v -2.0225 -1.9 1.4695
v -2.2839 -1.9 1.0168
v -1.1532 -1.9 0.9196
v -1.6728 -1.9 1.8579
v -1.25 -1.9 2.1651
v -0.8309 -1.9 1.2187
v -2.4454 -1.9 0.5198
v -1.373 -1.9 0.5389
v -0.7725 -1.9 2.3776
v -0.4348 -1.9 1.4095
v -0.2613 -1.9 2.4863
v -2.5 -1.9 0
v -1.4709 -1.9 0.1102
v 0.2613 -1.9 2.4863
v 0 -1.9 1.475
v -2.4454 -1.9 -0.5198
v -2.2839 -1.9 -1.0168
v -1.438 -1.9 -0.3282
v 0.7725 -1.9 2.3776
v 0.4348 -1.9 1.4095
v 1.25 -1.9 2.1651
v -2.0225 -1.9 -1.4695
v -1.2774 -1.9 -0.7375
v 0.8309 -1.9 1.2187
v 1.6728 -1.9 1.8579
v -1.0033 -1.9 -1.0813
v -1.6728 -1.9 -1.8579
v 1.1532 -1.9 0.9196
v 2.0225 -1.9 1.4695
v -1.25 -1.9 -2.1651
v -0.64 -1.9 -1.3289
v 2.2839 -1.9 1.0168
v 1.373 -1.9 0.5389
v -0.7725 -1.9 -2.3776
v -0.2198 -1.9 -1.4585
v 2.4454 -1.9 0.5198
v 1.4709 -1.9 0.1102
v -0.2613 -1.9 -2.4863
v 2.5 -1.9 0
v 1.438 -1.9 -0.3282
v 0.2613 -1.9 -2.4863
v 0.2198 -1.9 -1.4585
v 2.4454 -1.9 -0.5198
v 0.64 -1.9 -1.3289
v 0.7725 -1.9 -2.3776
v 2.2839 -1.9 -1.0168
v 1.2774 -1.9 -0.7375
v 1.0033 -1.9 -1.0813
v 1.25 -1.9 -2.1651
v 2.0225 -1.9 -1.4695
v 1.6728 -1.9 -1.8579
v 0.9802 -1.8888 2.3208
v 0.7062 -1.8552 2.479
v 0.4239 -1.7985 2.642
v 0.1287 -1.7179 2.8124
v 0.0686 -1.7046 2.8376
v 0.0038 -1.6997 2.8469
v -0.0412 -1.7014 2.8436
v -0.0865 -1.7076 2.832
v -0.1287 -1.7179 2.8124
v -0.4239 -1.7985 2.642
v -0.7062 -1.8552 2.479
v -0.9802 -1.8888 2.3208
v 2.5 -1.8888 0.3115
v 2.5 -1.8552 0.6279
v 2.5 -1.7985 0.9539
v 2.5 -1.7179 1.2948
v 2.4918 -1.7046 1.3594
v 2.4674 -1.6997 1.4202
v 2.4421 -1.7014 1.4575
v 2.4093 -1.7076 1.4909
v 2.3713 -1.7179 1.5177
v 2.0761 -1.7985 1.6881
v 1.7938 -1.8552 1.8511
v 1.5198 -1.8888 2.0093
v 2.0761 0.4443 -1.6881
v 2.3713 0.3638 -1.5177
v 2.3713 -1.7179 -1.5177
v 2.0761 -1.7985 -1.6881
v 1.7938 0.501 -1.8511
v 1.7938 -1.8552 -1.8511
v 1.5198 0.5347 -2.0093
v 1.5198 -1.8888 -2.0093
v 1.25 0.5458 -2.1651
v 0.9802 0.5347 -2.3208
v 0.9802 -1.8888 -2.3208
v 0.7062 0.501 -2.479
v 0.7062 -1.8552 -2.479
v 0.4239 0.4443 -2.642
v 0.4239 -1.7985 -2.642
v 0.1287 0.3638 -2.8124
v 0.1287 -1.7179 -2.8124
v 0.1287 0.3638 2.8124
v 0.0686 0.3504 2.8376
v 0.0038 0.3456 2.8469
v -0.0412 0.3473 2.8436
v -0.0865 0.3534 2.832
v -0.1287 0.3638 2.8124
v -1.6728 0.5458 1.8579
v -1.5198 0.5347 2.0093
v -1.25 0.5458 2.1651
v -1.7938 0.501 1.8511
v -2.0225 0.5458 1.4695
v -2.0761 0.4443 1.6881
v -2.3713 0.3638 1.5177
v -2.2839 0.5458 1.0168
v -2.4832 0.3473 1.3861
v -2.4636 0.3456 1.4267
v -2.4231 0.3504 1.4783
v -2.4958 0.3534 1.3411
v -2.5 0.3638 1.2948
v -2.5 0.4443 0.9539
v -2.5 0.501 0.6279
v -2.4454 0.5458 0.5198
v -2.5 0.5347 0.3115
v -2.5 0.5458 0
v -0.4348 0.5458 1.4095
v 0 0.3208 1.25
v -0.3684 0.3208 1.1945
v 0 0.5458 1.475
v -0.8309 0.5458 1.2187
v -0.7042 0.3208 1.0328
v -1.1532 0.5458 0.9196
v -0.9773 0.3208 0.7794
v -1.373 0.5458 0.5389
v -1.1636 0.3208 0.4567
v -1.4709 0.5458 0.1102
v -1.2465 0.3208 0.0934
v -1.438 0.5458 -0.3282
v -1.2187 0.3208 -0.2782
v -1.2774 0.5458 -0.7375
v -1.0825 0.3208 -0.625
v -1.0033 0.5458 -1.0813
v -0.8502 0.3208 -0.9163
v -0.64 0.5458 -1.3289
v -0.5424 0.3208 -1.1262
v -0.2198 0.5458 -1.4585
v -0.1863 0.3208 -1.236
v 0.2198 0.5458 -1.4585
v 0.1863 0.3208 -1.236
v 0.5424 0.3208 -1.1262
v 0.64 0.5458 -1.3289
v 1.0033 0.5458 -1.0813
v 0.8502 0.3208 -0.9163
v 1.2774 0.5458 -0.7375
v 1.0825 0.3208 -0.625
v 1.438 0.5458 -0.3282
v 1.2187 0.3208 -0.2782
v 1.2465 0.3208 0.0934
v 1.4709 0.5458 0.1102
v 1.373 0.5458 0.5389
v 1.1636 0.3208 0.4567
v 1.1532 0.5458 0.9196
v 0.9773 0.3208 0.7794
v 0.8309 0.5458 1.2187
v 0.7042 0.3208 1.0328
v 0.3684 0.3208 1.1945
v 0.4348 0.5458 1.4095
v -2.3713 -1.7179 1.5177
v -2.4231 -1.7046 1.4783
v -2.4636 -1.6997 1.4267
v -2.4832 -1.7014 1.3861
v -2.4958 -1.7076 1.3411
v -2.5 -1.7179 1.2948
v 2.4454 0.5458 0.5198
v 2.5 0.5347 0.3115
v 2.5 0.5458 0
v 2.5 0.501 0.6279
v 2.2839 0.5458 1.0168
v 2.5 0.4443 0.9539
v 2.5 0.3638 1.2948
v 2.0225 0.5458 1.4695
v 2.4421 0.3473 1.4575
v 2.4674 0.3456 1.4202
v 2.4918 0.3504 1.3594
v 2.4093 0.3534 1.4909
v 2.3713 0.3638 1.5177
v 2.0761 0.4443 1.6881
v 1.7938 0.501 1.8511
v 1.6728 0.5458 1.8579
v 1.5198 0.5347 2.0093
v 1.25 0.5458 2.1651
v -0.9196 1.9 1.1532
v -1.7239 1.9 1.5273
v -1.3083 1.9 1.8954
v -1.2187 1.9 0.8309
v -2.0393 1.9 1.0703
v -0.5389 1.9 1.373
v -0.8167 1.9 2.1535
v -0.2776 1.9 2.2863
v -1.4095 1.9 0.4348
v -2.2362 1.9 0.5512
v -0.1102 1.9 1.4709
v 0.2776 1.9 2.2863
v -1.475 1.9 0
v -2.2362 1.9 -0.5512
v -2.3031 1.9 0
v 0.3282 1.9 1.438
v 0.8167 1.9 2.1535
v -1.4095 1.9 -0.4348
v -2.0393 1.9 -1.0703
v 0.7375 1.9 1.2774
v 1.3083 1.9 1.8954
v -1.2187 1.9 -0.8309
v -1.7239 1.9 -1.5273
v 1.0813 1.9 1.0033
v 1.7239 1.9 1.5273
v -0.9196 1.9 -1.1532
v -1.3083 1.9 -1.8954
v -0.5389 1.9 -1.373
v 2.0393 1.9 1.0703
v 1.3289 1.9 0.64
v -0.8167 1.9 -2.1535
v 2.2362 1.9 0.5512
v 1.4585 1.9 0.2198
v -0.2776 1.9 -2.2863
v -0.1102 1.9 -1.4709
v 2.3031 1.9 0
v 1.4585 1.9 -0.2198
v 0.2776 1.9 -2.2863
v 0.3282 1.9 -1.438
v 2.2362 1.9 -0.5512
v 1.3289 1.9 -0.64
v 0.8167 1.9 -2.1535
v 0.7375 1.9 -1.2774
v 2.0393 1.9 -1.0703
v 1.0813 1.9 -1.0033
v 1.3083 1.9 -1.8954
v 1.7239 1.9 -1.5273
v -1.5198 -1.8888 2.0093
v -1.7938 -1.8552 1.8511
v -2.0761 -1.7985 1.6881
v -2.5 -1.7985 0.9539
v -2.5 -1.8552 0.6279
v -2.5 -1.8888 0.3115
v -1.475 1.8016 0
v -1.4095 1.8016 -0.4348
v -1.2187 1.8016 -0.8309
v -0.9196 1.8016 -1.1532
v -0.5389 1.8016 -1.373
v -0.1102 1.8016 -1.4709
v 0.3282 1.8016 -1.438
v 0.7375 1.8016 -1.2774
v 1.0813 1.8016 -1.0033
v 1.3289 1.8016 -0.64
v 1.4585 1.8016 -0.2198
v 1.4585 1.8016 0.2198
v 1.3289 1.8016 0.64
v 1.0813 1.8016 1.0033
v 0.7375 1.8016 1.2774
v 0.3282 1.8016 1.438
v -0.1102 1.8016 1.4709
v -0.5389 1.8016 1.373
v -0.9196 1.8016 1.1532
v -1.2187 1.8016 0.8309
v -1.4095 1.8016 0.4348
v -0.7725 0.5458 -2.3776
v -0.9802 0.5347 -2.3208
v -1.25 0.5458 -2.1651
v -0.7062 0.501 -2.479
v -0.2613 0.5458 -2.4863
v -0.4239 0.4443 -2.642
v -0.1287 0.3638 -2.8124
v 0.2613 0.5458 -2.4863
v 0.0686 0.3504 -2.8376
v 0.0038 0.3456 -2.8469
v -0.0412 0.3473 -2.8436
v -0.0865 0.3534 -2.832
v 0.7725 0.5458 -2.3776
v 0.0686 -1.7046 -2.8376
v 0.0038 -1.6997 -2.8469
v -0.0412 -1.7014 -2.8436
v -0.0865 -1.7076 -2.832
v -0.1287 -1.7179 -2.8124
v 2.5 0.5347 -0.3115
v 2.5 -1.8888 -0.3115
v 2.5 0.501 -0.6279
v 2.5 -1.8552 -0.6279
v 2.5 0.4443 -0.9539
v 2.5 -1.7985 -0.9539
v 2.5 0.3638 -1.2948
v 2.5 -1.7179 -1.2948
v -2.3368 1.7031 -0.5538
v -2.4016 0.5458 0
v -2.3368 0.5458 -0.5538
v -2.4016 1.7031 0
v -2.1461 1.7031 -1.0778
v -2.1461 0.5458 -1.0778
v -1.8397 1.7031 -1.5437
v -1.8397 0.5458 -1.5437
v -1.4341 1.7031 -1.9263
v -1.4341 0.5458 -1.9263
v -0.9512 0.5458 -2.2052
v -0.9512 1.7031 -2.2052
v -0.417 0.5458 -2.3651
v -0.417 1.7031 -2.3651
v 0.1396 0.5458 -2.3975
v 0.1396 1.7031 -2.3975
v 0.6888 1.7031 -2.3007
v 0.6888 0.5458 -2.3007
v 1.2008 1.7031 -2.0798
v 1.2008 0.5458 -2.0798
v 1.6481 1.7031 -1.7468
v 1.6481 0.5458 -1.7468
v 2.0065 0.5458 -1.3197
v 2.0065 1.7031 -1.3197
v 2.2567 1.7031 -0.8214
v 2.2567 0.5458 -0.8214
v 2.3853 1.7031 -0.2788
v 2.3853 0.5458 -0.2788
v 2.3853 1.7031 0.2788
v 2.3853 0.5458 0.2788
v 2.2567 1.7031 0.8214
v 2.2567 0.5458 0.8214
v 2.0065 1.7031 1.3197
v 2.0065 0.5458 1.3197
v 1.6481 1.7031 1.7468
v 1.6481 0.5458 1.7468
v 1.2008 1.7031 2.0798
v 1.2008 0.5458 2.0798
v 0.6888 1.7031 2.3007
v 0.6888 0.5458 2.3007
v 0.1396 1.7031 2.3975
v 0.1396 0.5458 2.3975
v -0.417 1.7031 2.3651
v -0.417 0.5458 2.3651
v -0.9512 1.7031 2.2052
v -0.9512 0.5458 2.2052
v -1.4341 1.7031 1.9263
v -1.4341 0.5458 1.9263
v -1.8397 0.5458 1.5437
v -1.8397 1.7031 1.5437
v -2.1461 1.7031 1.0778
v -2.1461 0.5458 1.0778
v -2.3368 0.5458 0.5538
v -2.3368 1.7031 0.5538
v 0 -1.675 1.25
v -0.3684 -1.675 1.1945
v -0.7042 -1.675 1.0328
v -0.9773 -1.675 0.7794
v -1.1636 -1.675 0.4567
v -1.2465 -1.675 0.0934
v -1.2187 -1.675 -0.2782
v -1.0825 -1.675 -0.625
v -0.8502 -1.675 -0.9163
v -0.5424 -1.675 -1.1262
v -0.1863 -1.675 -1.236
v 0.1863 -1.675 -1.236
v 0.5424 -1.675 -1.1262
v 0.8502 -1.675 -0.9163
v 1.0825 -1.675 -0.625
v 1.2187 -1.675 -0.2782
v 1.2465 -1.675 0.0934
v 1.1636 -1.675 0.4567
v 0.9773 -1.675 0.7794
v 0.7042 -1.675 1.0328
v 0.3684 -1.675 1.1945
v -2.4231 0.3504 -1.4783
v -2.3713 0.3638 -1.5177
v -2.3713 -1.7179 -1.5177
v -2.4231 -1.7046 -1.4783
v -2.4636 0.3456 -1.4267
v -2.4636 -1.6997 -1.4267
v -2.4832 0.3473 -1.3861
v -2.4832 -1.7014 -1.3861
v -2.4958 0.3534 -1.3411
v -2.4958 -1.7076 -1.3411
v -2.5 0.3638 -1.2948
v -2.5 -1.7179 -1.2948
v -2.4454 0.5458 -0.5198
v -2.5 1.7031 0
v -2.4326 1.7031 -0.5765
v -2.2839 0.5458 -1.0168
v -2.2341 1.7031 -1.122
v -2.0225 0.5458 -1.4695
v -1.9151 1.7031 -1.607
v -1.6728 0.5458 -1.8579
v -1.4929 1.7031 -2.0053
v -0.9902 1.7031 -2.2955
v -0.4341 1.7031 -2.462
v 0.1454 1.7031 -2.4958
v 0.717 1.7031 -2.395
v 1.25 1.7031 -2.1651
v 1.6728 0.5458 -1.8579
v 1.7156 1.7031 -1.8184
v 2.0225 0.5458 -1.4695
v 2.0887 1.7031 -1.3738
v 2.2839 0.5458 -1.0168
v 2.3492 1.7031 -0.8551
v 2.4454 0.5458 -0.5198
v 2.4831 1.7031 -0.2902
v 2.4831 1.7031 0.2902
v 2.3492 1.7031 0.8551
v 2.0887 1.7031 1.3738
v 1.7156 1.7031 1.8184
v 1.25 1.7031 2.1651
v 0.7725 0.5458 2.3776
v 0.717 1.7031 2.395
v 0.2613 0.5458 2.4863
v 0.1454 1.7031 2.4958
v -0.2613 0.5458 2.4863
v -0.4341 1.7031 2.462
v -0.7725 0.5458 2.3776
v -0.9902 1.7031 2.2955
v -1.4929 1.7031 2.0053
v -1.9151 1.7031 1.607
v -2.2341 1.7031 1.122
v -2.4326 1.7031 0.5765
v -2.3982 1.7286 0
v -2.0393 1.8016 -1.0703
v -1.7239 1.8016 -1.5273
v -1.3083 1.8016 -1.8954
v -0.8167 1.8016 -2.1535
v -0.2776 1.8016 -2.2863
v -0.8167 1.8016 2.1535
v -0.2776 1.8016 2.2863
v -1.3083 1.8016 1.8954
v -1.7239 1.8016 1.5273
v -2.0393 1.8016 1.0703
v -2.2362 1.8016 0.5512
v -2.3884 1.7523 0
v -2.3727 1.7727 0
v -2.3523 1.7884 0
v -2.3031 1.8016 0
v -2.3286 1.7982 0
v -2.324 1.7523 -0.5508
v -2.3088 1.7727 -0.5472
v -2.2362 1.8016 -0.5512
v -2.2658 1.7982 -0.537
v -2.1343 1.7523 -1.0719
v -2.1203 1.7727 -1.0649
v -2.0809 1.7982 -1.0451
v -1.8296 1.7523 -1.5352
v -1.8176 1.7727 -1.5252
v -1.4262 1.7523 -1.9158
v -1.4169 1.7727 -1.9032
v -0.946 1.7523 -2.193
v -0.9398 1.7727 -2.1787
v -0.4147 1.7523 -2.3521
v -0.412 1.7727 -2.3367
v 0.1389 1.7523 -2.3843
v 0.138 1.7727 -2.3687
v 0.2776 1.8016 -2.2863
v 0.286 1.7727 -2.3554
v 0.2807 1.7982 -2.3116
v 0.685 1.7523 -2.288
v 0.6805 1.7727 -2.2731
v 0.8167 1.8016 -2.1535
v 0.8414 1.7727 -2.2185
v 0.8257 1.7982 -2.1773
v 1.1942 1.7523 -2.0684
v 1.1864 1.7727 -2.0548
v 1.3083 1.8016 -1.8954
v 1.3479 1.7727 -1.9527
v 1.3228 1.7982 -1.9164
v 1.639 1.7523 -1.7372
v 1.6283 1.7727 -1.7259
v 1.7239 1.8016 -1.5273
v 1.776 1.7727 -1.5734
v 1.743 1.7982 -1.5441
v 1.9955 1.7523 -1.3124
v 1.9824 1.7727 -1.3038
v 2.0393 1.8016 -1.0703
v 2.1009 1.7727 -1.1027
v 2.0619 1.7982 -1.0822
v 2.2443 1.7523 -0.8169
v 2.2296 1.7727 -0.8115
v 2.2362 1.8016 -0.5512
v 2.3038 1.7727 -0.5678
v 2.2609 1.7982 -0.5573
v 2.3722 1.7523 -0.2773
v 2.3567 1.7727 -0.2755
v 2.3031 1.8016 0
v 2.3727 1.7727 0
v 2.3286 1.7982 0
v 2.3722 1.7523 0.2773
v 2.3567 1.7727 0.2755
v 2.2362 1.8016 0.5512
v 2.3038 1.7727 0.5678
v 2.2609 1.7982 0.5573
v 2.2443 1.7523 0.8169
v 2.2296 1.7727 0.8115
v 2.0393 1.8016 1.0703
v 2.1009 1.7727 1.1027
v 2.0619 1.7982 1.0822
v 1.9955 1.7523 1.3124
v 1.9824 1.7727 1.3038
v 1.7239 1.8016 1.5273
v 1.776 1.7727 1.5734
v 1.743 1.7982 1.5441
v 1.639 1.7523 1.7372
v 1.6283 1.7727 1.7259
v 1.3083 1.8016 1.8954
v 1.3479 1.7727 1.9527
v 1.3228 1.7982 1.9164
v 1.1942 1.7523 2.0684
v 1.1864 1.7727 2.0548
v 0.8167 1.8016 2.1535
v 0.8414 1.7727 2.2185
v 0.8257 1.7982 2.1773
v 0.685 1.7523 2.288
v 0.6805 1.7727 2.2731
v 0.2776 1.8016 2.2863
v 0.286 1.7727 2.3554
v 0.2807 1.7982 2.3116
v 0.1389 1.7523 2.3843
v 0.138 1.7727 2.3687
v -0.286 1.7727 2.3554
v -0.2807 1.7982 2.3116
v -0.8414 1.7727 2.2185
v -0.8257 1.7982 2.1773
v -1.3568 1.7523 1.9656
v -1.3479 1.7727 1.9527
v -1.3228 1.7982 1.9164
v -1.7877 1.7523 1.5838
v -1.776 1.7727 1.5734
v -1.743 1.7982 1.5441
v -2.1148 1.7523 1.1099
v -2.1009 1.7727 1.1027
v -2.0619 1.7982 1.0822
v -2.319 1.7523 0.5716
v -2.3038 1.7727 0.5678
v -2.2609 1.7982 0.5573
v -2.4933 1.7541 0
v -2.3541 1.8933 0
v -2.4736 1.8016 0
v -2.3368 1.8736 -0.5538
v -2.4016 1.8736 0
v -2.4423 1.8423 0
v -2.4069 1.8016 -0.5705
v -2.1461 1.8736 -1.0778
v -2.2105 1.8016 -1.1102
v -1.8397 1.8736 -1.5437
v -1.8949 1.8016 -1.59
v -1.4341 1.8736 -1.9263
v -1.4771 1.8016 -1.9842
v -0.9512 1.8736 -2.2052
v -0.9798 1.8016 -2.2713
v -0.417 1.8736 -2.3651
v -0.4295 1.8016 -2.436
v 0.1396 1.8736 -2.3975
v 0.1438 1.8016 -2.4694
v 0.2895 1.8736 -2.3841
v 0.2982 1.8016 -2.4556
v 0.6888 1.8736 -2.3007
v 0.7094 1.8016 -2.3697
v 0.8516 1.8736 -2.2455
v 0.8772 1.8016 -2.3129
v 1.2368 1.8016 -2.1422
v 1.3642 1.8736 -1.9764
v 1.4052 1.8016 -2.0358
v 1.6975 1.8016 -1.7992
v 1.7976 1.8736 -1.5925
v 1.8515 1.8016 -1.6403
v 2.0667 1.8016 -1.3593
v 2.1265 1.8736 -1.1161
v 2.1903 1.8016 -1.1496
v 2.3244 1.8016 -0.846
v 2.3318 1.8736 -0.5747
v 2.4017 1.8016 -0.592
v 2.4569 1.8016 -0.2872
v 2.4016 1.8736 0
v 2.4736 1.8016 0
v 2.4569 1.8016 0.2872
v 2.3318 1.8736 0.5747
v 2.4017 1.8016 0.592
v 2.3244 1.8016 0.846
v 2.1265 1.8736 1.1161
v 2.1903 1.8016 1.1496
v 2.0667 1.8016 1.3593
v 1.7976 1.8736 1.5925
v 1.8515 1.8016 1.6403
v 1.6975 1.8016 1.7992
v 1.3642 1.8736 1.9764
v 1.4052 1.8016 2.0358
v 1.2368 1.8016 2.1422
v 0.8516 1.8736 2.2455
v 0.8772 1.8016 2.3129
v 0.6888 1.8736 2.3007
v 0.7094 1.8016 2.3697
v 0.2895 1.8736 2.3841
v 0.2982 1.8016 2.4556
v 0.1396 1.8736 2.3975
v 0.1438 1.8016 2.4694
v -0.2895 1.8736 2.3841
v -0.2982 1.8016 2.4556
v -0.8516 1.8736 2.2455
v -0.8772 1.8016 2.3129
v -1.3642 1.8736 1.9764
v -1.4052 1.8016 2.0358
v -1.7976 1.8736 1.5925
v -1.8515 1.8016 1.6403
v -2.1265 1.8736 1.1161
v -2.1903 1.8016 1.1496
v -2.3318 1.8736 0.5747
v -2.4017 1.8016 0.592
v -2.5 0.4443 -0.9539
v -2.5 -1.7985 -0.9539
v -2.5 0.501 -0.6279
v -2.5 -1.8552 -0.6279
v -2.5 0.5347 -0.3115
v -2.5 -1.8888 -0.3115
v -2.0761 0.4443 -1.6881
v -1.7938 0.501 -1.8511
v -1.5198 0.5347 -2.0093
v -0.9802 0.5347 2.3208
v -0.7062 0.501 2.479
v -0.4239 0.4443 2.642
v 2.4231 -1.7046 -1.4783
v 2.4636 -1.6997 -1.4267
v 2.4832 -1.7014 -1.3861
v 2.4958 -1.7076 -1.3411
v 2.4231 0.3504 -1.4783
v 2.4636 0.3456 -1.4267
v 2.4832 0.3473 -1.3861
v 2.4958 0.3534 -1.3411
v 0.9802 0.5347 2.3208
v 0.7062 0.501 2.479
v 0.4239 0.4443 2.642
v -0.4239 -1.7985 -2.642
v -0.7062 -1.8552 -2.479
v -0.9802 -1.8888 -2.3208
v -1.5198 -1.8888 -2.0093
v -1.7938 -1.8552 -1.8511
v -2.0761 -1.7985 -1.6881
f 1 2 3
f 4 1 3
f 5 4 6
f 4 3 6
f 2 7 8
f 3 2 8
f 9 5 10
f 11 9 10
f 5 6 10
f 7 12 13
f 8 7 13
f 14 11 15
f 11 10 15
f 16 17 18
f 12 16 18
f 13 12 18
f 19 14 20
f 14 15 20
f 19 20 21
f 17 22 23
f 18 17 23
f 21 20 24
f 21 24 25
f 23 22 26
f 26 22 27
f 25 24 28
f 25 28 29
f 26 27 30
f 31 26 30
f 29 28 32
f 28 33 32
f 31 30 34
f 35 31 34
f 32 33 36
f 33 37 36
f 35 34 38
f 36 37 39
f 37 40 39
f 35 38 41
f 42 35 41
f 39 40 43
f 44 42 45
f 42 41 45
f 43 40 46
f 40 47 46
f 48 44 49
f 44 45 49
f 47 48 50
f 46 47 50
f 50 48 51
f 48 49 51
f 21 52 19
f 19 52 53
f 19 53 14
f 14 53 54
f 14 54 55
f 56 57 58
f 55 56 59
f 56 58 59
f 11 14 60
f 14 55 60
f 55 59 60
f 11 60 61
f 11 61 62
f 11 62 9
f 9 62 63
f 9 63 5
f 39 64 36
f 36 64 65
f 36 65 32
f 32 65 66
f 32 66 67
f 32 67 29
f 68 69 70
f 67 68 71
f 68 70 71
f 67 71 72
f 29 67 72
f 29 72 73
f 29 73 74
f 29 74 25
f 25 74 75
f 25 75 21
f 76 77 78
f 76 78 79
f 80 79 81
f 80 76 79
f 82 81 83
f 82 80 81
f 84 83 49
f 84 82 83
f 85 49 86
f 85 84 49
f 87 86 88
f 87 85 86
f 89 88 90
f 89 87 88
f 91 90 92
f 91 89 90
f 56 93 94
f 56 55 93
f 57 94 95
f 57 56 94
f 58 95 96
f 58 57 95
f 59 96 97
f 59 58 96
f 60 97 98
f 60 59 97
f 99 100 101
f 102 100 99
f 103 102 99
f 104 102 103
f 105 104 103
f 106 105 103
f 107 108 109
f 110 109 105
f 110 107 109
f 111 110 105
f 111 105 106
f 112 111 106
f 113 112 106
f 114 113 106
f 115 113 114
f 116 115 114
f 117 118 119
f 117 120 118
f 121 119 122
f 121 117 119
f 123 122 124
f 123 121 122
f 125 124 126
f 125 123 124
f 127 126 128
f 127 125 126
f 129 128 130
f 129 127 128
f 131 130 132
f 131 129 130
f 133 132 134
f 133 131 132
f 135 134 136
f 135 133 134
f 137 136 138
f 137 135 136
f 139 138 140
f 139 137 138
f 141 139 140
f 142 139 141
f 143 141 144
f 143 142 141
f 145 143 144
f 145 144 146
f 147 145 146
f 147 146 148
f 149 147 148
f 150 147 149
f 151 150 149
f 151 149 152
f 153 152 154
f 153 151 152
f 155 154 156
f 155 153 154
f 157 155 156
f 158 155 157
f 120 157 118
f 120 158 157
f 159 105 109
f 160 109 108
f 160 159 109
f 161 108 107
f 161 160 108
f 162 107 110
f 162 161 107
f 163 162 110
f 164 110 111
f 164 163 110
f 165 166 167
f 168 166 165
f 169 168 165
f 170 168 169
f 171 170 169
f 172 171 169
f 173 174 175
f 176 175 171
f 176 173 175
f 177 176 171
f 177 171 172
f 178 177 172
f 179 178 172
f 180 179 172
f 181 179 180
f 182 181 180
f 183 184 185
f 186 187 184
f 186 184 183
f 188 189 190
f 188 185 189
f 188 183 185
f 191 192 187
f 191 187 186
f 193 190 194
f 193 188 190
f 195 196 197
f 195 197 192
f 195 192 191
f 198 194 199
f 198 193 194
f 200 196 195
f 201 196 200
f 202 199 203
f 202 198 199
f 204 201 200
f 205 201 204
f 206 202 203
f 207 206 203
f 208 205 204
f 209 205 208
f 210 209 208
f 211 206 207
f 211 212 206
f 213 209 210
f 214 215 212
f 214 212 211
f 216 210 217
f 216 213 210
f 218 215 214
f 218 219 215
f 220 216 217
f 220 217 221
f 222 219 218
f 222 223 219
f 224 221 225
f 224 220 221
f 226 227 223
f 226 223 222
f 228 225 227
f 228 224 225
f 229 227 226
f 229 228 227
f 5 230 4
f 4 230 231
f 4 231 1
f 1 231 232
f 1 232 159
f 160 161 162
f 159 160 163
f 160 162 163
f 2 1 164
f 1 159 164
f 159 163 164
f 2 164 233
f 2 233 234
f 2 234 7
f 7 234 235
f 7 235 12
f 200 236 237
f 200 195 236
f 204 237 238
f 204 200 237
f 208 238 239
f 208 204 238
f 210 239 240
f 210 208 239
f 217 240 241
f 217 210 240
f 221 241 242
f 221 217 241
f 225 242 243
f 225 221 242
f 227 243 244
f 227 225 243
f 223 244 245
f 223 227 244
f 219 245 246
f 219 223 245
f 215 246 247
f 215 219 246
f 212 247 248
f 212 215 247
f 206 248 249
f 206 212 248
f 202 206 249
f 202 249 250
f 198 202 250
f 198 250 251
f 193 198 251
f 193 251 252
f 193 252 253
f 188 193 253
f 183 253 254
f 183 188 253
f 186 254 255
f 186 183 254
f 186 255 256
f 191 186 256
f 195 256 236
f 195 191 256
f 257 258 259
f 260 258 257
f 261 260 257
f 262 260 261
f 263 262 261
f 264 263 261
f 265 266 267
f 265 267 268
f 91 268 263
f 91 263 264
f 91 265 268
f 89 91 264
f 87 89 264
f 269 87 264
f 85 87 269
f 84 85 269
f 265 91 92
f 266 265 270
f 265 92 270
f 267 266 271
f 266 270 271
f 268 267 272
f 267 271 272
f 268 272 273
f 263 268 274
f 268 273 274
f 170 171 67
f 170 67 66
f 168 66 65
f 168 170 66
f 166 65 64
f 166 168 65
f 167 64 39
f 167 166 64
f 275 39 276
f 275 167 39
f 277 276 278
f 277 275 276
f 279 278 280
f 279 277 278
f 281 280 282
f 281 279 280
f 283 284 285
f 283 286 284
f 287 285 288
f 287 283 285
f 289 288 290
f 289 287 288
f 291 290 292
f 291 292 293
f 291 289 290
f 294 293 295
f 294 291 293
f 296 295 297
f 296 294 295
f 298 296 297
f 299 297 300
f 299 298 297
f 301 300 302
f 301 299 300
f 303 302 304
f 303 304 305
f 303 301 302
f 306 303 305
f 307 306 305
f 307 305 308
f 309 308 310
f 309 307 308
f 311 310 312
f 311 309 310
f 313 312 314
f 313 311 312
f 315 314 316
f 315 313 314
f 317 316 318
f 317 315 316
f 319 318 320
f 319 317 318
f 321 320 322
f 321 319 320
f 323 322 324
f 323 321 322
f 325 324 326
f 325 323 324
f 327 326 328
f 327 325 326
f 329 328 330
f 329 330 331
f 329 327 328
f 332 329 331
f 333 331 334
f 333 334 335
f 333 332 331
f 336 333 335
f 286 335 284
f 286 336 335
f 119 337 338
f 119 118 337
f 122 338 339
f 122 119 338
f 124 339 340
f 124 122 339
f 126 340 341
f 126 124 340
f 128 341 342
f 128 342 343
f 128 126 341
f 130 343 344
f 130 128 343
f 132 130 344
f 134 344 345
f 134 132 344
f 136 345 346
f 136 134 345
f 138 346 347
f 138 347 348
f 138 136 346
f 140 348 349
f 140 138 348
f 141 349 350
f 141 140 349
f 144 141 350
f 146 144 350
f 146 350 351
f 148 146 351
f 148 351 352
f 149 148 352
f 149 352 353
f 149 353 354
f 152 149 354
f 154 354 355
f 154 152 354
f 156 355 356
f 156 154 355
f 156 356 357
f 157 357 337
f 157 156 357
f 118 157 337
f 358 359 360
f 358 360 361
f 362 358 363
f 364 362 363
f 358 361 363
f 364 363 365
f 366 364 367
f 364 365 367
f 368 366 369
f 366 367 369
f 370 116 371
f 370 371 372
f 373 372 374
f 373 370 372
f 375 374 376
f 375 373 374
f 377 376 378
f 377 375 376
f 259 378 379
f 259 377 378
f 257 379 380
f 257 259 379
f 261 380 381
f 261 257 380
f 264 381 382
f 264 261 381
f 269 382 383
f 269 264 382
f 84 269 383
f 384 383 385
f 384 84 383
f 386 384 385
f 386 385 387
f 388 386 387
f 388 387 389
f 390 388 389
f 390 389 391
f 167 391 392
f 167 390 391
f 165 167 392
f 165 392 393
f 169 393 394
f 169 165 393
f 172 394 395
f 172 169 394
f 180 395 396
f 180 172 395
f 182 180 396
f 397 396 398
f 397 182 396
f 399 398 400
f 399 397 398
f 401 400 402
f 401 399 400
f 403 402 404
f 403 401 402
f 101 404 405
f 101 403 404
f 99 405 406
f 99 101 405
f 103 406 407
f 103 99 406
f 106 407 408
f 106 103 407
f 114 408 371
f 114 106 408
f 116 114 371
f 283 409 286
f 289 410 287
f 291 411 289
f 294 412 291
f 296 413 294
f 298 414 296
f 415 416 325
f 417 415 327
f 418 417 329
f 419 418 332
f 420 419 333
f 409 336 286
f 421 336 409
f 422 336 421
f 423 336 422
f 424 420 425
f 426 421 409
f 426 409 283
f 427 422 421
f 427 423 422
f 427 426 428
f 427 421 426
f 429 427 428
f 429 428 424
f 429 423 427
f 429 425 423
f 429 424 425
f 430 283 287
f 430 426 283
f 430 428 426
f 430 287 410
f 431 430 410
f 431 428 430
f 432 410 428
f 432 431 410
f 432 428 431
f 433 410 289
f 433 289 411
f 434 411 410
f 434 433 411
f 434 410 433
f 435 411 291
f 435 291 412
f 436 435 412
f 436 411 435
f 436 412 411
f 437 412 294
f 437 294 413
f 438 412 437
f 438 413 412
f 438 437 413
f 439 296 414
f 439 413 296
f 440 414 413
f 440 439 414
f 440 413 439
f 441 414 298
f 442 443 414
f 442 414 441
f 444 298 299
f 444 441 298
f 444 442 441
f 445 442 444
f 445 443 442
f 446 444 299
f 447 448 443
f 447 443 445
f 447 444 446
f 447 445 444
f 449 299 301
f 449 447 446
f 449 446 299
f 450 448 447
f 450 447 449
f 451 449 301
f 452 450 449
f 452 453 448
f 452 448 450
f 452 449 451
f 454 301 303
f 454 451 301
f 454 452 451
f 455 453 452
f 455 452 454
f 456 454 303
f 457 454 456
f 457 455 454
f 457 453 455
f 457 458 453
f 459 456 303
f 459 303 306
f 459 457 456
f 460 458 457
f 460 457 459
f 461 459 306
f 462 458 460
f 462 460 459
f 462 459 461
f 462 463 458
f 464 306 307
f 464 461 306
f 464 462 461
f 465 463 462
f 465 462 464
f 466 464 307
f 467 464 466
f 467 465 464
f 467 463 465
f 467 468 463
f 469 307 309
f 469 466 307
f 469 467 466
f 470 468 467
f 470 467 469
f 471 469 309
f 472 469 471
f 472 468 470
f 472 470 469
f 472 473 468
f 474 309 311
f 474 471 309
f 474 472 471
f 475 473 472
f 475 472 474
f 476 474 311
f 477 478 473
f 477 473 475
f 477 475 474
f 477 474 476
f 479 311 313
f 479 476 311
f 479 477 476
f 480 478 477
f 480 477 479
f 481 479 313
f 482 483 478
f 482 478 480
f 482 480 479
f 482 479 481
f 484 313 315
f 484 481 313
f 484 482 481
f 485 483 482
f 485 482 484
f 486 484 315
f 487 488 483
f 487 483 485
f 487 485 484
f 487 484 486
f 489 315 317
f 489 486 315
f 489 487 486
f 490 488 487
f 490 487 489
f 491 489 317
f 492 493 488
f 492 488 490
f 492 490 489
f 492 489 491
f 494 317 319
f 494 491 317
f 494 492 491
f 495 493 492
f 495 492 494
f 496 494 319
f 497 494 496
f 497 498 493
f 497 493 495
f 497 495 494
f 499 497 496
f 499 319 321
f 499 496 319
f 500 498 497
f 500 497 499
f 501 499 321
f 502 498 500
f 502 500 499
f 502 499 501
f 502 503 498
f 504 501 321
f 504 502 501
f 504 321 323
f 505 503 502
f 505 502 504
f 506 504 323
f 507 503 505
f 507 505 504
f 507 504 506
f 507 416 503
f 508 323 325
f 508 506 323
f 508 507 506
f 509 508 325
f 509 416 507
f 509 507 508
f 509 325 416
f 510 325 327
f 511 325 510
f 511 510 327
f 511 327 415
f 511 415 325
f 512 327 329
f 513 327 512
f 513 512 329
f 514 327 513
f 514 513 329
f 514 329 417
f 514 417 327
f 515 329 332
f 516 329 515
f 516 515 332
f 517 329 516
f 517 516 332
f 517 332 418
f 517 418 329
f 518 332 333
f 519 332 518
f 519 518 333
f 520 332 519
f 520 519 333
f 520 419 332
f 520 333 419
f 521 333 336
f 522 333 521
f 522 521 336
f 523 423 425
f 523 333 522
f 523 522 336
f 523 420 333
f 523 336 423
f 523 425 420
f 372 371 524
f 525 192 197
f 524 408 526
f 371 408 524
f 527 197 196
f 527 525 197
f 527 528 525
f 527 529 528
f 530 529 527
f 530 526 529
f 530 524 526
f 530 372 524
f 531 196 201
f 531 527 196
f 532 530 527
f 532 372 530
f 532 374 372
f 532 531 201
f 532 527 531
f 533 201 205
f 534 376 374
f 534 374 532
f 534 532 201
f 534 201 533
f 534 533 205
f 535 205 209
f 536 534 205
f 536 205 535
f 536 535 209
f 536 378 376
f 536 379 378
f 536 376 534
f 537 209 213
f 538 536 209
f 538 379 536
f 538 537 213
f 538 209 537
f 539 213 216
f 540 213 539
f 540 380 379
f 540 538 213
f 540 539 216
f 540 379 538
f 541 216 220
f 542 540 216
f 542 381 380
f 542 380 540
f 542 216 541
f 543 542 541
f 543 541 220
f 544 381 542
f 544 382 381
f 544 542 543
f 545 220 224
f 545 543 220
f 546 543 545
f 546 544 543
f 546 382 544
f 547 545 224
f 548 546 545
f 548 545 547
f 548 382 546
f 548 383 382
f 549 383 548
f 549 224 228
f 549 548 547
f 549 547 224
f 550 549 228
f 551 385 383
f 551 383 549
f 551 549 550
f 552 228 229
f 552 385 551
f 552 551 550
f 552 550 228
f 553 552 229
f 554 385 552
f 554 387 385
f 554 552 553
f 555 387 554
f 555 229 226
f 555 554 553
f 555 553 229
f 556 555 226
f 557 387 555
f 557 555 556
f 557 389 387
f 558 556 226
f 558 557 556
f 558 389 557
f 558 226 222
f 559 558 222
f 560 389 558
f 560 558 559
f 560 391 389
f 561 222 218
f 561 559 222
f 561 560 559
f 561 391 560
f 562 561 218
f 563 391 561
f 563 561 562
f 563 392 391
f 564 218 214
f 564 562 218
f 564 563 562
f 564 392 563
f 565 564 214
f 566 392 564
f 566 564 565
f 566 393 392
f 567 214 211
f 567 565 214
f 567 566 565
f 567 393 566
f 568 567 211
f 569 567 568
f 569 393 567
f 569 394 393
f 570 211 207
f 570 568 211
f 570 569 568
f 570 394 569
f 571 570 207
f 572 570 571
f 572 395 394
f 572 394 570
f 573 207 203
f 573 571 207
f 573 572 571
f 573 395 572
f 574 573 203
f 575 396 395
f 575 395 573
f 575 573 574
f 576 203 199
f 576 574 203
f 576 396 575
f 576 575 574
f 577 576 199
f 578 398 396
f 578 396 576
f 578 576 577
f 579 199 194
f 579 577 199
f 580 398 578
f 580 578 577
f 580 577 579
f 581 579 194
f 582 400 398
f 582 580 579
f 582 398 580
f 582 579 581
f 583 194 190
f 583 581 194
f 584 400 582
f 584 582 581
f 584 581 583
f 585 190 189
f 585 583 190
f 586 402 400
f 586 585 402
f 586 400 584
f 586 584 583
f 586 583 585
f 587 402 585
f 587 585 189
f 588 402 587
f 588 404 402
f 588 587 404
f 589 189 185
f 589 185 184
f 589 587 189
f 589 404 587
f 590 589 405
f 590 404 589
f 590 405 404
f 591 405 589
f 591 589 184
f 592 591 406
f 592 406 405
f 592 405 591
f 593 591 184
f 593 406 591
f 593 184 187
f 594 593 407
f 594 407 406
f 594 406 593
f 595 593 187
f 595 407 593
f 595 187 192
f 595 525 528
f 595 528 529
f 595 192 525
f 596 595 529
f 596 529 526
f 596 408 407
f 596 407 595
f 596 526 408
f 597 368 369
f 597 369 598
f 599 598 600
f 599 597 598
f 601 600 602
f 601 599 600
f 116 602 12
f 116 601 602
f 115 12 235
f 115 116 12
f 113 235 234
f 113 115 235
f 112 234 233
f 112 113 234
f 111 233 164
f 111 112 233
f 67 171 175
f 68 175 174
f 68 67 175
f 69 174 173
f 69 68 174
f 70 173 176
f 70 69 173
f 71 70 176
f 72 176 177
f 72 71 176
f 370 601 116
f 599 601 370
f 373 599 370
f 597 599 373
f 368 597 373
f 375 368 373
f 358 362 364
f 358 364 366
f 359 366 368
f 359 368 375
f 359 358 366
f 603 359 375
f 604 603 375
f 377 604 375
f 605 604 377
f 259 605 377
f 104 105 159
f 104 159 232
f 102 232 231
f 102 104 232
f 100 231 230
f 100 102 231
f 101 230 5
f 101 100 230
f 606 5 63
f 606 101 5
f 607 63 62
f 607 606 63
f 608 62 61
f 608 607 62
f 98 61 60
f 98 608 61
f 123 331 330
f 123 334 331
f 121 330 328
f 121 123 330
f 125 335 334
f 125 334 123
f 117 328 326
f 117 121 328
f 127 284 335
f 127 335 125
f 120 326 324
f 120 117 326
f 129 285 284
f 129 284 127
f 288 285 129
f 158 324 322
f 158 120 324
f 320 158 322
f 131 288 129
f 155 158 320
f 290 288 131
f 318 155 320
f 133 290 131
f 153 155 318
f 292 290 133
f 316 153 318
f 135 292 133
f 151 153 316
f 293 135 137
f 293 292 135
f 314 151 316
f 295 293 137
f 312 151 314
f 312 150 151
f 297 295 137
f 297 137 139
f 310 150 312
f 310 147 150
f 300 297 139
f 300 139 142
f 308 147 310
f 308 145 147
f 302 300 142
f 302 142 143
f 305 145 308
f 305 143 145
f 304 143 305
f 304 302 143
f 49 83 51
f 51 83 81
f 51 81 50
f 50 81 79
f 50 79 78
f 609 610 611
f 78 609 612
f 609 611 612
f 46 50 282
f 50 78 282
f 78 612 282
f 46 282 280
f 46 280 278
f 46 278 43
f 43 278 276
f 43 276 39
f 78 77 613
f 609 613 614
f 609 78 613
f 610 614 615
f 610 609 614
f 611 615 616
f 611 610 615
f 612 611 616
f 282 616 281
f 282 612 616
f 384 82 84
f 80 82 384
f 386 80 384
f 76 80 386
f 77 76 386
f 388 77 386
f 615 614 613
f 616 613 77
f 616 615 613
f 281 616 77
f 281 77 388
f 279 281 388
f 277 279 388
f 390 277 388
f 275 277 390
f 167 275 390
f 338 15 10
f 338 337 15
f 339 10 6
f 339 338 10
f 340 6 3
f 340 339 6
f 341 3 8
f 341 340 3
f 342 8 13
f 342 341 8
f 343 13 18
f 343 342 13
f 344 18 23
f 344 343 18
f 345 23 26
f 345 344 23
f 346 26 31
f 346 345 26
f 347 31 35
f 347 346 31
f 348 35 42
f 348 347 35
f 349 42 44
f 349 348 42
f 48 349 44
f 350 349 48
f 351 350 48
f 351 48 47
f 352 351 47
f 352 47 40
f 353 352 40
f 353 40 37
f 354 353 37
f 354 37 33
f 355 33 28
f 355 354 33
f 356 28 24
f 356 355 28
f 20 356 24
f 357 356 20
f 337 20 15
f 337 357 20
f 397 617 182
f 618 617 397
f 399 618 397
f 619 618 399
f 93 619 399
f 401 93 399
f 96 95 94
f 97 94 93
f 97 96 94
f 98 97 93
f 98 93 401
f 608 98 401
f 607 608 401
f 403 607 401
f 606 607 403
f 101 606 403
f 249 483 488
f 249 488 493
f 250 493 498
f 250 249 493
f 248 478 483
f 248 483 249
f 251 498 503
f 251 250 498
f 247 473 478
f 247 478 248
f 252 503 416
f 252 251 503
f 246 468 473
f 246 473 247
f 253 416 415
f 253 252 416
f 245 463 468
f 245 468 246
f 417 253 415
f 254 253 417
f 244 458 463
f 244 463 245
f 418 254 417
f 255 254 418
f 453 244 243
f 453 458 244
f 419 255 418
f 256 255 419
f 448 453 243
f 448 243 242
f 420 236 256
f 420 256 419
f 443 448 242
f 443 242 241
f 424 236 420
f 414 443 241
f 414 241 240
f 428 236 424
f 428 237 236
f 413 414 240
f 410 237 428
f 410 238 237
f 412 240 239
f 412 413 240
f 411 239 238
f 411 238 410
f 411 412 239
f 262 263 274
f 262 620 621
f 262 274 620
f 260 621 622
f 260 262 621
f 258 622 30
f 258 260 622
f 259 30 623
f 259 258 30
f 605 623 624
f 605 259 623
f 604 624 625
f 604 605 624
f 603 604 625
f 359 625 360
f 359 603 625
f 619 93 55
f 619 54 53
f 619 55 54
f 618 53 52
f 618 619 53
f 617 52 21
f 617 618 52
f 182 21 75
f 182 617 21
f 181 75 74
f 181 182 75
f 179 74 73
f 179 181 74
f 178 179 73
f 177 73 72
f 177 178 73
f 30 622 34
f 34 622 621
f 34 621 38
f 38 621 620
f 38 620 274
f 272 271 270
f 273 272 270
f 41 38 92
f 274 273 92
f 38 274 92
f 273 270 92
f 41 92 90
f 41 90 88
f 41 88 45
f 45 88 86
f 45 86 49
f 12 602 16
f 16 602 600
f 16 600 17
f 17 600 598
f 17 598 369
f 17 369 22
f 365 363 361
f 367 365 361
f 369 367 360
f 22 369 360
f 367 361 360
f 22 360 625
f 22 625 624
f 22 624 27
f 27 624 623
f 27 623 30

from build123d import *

# Parameters (mm, degrees)
BOSS_EXTRUDE1_START = 0.545843
BOSS_EXTRUDE1_DEPTH = 2.445843
FILLET1_R           = 0.257407407


with BuildPart() as part:
    # Sketch2 → Boss-Extrude1 (new body)
    with BuildSketch(Plane(origin=(0, 0, 0), x_dir=(1, 0, 0), z_dir=(0, 1, 0)).offset(BOSS_EXTRUDE1_START)):
        Polygon((2.5, 1.443375673), (0, 2.886751346), (-2.5, 1.443375673), (-2.5, -1.443375673), (0, -2.886751346), (2.5, -1.443375673), align=None)
    extrude(amount=-BOSS_EXTRUDE1_DEPTH)

    # Sketch3 → Cut-Revolve1 (revolve, cut)
    with BuildSketch(Plane.XY):
        Polygon((1.25, 1.267530544), (2.896111111, 0.317147851), (2.896111111, 1.267530544), align=None)
        Polygon((1.25, -2.621687836), (2.896111111, -1.671305143), (2.896111111, -2.621687836), align=None)
    revolve(axis=Axis((0, 1.9, 0), (0, -1, 0)), mode=Mode.SUBTRACT)

    # Fillet1
    fillet1_edges = [part.edges().sort_by_distance(p)[0] for p in [
        (-2.5, -0.677078646, -1.443375673),
        (-2.5, -0.677078646, 1.443375673),
        (0, -0.677078646, 2.886751346),
        (0, -0.677078646, -2.886751346),
        (2.5, -0.677078646, -1.443375673),
        (2.5, -0.677078646, 1.443375673),
    ]]
    fillet(fillet1_edges, radius=FILLET1_R)

    # Sketch5 → Cut-Revolve2 (revolve, cut)
    with BuildSketch(Plane.XY, mode=Mode.PRIVATE) as cut_revolve2_sk:
        Polygon((-1.475, -1.9), (-1.25, -1.675), (-1.25, 0.320842708), (-1.475, 0.545842708), (0, 0.545842708), (0, -1.9), align=None)
    revolve(cut_revolve2_sk.sketch.rotate(Axis((0, 1.9, 0), (0, -1, 0)), 270), axis=Axis((0, 1.9, 0), (0, -1, 0)), mode=Mode.SUBTRACT)


with BuildPart() as revolve1_tool:
    # Sketch4 → Revolve1 (revolve)
    with BuildSketch(Plane.XY):
        with BuildLine():
            Line((-1.475, 1.9), (-2.303125, 1.9))
            ThreePointArc((-2.303125, 1.9), (-2.442336648, 1.842336648), (-2.5, 1.703125))
            Line((-2.5, 1.703125), (-2.5, 0.545842708))
            Line((-2.5, 0.545842708), (-2.4015625, 0.545842708))
            Line((-2.4015625, 0.545842708), (-2.4015625, 1.703125))
            ThreePointArc((-2.4015625, 1.703125), (-2.372730824, 1.772730824), (-2.303125, 1.8015625))
            Line((-2.303125, 1.8015625), (-1.475, 1.8015625))
            Line((-1.475, 1.8015625), (-1.475, 1.9))
        make_face()
    revolve(axis=Axis((0, 1.9, 0), (0, -1, 0)))


with BuildPart() as part_1:
    add(part.part)


with BuildPart() as part_2:
    # Revolve1: joined with revolve1_tool
    add(part_1.part.fuse(revolve1_tool.part, tol=0.00001))


solid = part_2.part
